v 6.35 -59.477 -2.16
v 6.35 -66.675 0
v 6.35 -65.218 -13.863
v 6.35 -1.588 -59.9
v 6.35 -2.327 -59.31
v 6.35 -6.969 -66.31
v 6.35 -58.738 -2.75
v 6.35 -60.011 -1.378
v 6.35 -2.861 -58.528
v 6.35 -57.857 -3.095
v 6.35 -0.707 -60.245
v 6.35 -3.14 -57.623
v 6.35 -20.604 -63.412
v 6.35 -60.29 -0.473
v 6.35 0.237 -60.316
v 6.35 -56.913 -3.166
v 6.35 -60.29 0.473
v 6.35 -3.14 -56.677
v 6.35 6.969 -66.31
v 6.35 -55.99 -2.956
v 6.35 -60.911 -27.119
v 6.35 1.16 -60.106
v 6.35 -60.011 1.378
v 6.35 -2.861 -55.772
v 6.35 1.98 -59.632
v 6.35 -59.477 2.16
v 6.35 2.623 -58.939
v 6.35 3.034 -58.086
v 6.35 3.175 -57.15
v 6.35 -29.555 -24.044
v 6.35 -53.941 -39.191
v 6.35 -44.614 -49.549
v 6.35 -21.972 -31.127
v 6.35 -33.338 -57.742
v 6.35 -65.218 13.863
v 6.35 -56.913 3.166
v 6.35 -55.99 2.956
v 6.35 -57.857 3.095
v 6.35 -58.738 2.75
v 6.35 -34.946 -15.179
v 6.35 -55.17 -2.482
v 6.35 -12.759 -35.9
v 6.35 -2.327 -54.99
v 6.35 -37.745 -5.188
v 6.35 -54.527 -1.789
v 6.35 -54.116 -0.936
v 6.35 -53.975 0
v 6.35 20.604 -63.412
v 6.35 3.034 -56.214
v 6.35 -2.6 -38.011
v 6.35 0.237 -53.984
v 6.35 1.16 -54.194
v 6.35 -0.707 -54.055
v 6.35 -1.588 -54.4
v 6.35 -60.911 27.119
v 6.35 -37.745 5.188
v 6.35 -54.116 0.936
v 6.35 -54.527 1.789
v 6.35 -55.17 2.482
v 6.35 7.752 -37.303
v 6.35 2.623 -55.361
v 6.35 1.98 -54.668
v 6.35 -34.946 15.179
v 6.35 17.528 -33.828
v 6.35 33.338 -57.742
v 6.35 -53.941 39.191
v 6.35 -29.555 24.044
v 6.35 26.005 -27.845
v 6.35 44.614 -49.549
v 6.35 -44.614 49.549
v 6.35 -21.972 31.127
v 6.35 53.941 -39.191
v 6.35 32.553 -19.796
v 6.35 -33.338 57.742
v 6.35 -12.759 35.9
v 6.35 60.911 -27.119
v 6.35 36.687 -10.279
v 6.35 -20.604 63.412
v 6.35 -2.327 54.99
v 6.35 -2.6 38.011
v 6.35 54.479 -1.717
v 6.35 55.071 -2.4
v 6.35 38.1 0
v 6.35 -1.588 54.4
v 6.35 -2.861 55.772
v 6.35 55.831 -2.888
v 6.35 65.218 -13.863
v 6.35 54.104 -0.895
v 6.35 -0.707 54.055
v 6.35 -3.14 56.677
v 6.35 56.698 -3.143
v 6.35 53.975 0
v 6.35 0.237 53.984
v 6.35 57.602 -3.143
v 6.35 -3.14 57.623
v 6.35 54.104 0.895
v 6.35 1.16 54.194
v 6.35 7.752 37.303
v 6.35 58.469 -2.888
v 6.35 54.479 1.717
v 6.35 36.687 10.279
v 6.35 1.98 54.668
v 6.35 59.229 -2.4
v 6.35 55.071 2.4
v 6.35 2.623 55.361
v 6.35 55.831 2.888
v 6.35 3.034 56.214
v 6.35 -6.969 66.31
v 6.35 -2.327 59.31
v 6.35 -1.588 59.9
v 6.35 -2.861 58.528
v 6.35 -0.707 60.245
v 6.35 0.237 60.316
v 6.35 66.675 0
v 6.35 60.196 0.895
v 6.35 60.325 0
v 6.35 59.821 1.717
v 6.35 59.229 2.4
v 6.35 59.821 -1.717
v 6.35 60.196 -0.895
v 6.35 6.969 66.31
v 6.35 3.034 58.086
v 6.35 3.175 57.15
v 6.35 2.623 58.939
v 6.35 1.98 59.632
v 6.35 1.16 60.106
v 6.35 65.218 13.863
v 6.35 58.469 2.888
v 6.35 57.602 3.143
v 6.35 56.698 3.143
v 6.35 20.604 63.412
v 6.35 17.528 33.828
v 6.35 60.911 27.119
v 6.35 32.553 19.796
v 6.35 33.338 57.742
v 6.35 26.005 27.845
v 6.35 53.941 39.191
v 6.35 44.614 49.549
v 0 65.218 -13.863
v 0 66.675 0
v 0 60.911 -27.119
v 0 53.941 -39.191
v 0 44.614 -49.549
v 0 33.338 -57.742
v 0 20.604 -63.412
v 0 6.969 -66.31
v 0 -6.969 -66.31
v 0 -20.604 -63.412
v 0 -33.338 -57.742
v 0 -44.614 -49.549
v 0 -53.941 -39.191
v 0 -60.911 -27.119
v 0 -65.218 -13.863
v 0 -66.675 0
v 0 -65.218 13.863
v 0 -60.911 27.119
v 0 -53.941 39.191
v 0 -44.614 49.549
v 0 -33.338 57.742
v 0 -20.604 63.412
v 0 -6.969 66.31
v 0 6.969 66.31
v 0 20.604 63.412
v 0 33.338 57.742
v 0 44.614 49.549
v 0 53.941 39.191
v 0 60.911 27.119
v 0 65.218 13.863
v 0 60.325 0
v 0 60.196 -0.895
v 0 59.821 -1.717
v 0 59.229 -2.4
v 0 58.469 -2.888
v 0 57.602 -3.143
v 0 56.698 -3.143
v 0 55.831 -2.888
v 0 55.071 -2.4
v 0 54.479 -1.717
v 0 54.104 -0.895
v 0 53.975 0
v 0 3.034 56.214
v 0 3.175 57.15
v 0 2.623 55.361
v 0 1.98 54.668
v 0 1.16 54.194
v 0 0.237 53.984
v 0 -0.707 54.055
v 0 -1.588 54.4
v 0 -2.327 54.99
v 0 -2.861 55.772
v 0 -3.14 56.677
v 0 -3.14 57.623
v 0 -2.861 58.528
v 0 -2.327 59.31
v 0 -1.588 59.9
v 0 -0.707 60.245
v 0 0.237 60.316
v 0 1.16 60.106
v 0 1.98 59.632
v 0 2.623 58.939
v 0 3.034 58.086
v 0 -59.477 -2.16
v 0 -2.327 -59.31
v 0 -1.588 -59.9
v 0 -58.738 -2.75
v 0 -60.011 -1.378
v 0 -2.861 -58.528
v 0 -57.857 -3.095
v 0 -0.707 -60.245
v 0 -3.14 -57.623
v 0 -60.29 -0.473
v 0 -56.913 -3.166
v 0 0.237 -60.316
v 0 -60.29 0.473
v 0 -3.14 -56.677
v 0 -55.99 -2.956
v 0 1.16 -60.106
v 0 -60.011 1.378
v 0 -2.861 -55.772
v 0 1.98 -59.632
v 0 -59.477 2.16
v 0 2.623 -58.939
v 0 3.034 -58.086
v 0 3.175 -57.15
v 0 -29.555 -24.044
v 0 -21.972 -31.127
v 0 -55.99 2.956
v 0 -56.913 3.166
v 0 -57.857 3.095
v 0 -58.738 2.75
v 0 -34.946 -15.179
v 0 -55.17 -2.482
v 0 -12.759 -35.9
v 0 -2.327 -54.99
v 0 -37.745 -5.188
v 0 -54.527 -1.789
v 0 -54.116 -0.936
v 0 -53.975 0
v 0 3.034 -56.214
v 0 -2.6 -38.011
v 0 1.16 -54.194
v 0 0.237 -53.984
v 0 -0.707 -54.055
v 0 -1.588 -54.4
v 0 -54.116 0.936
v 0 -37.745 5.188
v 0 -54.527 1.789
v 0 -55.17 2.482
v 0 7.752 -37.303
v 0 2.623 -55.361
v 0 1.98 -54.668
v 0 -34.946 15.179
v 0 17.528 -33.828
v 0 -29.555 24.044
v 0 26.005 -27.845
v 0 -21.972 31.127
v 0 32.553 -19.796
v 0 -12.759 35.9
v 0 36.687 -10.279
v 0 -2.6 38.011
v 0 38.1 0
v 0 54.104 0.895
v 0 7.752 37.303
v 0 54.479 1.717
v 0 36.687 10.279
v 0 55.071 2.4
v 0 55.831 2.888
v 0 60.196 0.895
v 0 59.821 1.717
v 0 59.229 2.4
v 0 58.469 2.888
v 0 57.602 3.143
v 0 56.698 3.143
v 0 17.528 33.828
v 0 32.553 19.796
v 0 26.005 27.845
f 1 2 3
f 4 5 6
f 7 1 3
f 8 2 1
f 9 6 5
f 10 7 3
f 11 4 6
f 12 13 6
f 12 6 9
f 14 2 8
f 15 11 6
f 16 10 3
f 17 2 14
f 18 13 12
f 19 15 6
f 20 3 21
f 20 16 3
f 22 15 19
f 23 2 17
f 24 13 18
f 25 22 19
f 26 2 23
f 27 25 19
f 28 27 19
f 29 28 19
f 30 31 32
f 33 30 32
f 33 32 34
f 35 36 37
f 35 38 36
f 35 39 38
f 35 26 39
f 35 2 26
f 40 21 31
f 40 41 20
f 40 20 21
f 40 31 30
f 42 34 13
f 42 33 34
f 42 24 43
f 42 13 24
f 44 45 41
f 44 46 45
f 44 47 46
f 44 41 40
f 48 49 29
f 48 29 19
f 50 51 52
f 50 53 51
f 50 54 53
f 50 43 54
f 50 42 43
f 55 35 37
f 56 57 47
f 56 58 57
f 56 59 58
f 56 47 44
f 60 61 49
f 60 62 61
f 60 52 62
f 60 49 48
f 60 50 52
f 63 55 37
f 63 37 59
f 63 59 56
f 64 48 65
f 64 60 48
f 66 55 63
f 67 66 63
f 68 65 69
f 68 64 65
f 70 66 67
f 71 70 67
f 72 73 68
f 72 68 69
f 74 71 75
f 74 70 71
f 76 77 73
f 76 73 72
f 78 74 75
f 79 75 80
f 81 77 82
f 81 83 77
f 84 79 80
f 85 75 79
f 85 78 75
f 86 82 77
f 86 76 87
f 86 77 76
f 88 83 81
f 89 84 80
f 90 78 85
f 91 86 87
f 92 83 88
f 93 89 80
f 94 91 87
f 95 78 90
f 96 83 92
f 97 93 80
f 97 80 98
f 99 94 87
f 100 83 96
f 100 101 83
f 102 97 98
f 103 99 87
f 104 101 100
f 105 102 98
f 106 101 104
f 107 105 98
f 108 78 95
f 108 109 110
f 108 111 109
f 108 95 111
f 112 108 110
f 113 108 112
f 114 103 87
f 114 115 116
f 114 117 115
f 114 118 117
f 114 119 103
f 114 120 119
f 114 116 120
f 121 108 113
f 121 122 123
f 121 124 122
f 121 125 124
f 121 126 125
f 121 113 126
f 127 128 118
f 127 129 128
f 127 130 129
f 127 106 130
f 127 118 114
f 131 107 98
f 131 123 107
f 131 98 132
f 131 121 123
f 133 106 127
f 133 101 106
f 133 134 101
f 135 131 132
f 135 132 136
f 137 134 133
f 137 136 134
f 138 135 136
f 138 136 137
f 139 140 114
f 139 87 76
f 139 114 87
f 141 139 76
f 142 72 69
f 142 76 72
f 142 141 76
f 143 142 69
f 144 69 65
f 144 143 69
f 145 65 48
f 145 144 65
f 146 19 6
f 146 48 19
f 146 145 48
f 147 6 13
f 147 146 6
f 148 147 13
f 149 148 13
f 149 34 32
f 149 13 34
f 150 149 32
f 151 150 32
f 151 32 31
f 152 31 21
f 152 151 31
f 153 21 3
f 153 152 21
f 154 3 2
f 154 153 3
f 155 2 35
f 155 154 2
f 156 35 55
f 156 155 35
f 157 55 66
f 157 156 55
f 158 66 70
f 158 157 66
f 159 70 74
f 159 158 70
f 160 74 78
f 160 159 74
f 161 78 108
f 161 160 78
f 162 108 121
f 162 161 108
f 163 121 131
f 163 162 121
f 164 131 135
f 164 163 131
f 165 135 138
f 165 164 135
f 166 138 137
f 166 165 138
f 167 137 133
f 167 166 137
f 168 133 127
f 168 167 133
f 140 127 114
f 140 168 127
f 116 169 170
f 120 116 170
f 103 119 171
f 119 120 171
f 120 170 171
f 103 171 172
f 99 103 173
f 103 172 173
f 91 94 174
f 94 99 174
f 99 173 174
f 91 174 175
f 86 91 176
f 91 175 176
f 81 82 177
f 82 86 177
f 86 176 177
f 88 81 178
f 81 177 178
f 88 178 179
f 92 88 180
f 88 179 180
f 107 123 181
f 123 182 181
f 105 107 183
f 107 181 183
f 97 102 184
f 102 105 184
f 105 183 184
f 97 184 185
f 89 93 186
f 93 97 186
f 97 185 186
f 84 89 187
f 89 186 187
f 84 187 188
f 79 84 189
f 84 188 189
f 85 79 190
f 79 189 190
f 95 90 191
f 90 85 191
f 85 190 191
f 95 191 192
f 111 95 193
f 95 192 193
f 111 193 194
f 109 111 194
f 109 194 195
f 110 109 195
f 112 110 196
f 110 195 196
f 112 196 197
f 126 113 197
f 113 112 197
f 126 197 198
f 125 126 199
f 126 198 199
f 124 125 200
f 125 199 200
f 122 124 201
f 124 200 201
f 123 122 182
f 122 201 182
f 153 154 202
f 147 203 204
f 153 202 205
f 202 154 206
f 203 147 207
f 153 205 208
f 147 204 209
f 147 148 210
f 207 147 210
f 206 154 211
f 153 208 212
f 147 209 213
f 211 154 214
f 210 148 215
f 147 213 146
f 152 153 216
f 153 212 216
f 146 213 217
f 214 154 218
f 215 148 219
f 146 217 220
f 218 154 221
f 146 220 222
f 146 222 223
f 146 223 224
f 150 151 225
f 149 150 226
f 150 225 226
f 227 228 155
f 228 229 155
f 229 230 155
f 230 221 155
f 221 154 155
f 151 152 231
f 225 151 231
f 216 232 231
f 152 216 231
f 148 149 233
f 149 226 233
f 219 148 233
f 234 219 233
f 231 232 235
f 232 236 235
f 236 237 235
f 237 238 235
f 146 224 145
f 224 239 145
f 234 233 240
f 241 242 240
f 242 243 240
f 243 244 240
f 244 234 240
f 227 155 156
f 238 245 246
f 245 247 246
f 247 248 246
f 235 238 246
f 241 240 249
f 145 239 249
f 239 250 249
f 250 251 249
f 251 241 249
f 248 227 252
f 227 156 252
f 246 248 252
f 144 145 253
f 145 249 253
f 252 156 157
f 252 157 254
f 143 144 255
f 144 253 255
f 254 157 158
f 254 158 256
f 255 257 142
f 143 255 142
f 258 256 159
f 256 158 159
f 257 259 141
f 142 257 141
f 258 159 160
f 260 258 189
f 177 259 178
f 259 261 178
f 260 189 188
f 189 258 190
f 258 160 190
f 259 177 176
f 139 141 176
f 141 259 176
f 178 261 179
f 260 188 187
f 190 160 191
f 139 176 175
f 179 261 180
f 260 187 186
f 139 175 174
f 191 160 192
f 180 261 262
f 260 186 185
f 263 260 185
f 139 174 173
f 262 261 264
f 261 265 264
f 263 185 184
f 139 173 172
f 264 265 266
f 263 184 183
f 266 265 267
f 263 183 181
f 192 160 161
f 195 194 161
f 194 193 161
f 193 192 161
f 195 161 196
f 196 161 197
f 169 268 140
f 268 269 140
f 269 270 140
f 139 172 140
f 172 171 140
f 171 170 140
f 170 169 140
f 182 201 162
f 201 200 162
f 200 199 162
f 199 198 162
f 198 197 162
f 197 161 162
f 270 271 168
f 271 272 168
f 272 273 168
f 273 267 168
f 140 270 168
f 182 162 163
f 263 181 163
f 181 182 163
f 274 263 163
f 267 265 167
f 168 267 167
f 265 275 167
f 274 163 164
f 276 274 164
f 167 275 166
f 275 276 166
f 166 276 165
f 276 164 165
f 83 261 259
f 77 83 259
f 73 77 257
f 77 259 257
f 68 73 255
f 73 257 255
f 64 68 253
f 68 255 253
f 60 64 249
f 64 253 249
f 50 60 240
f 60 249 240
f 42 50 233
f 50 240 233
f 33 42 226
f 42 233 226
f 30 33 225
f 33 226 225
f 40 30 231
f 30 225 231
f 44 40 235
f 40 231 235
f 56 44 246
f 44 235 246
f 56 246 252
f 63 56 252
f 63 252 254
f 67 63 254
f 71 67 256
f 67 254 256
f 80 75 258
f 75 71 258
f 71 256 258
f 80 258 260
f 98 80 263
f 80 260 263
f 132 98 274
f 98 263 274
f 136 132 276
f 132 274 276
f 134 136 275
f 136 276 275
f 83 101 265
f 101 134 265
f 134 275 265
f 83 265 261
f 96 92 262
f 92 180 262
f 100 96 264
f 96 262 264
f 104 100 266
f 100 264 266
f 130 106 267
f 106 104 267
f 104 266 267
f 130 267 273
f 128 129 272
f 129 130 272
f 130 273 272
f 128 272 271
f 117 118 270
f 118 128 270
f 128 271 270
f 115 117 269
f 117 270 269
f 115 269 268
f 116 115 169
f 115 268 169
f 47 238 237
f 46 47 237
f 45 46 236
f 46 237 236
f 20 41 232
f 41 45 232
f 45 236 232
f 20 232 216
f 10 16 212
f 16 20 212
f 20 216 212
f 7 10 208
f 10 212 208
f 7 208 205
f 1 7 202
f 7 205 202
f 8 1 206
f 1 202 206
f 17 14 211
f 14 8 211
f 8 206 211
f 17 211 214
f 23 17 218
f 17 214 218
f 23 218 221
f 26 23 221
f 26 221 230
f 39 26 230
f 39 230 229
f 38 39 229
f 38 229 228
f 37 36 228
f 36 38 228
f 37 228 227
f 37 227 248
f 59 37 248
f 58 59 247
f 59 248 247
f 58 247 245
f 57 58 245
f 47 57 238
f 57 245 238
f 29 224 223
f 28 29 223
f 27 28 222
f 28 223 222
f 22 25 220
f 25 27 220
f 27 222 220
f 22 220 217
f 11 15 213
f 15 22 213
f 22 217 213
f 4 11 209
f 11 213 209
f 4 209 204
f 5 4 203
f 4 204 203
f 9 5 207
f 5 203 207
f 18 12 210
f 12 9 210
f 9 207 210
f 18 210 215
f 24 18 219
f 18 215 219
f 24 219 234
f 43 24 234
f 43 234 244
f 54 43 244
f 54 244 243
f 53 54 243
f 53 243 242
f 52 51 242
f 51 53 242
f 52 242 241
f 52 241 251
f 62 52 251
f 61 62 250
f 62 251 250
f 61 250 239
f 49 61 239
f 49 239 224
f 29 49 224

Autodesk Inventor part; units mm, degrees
ref_plane "YZ Plane" through (0, 0, 0) normal (1, 0, 0) x (0, 1, 0)
ref_plane "XZ Plane" through (0, 0, 0) normal (0, 1, 0) x (-1, 0, 0)
ref_plane "XY Plane" through (0, 0, 0) normal (0, 0, 1) x (1, 0, 0)
sketch "Sketch3" plane through (0, 0, 0) normal (1, 0, 0) x (0, 1, 0)
  circle A0 centre (0, 0) radius 66.675
  circle A1 centre (0, -57.15) radius 3.175
  circle A2 centre (57.15, 0) radius 3.175
  circle A3 centre (0, 57.15) radius 3.175
  circle A4 centre (-57.15, 0) radius 3.175
  line L0 (0, 0) -> (79.9058, 0)
  circle A5 centre (0, 0) radius 38.1
  dimension "d13" = 133.35
  dimension "d14" = 6.35
  dimension "d17" = 360
  dimension "d19" = 57.15
  dimension "d20" = 76.2
extrude "Extrusion3" add sketch "Sketch3" along normal blind 6.35
properties part number "BearingAdapter"
